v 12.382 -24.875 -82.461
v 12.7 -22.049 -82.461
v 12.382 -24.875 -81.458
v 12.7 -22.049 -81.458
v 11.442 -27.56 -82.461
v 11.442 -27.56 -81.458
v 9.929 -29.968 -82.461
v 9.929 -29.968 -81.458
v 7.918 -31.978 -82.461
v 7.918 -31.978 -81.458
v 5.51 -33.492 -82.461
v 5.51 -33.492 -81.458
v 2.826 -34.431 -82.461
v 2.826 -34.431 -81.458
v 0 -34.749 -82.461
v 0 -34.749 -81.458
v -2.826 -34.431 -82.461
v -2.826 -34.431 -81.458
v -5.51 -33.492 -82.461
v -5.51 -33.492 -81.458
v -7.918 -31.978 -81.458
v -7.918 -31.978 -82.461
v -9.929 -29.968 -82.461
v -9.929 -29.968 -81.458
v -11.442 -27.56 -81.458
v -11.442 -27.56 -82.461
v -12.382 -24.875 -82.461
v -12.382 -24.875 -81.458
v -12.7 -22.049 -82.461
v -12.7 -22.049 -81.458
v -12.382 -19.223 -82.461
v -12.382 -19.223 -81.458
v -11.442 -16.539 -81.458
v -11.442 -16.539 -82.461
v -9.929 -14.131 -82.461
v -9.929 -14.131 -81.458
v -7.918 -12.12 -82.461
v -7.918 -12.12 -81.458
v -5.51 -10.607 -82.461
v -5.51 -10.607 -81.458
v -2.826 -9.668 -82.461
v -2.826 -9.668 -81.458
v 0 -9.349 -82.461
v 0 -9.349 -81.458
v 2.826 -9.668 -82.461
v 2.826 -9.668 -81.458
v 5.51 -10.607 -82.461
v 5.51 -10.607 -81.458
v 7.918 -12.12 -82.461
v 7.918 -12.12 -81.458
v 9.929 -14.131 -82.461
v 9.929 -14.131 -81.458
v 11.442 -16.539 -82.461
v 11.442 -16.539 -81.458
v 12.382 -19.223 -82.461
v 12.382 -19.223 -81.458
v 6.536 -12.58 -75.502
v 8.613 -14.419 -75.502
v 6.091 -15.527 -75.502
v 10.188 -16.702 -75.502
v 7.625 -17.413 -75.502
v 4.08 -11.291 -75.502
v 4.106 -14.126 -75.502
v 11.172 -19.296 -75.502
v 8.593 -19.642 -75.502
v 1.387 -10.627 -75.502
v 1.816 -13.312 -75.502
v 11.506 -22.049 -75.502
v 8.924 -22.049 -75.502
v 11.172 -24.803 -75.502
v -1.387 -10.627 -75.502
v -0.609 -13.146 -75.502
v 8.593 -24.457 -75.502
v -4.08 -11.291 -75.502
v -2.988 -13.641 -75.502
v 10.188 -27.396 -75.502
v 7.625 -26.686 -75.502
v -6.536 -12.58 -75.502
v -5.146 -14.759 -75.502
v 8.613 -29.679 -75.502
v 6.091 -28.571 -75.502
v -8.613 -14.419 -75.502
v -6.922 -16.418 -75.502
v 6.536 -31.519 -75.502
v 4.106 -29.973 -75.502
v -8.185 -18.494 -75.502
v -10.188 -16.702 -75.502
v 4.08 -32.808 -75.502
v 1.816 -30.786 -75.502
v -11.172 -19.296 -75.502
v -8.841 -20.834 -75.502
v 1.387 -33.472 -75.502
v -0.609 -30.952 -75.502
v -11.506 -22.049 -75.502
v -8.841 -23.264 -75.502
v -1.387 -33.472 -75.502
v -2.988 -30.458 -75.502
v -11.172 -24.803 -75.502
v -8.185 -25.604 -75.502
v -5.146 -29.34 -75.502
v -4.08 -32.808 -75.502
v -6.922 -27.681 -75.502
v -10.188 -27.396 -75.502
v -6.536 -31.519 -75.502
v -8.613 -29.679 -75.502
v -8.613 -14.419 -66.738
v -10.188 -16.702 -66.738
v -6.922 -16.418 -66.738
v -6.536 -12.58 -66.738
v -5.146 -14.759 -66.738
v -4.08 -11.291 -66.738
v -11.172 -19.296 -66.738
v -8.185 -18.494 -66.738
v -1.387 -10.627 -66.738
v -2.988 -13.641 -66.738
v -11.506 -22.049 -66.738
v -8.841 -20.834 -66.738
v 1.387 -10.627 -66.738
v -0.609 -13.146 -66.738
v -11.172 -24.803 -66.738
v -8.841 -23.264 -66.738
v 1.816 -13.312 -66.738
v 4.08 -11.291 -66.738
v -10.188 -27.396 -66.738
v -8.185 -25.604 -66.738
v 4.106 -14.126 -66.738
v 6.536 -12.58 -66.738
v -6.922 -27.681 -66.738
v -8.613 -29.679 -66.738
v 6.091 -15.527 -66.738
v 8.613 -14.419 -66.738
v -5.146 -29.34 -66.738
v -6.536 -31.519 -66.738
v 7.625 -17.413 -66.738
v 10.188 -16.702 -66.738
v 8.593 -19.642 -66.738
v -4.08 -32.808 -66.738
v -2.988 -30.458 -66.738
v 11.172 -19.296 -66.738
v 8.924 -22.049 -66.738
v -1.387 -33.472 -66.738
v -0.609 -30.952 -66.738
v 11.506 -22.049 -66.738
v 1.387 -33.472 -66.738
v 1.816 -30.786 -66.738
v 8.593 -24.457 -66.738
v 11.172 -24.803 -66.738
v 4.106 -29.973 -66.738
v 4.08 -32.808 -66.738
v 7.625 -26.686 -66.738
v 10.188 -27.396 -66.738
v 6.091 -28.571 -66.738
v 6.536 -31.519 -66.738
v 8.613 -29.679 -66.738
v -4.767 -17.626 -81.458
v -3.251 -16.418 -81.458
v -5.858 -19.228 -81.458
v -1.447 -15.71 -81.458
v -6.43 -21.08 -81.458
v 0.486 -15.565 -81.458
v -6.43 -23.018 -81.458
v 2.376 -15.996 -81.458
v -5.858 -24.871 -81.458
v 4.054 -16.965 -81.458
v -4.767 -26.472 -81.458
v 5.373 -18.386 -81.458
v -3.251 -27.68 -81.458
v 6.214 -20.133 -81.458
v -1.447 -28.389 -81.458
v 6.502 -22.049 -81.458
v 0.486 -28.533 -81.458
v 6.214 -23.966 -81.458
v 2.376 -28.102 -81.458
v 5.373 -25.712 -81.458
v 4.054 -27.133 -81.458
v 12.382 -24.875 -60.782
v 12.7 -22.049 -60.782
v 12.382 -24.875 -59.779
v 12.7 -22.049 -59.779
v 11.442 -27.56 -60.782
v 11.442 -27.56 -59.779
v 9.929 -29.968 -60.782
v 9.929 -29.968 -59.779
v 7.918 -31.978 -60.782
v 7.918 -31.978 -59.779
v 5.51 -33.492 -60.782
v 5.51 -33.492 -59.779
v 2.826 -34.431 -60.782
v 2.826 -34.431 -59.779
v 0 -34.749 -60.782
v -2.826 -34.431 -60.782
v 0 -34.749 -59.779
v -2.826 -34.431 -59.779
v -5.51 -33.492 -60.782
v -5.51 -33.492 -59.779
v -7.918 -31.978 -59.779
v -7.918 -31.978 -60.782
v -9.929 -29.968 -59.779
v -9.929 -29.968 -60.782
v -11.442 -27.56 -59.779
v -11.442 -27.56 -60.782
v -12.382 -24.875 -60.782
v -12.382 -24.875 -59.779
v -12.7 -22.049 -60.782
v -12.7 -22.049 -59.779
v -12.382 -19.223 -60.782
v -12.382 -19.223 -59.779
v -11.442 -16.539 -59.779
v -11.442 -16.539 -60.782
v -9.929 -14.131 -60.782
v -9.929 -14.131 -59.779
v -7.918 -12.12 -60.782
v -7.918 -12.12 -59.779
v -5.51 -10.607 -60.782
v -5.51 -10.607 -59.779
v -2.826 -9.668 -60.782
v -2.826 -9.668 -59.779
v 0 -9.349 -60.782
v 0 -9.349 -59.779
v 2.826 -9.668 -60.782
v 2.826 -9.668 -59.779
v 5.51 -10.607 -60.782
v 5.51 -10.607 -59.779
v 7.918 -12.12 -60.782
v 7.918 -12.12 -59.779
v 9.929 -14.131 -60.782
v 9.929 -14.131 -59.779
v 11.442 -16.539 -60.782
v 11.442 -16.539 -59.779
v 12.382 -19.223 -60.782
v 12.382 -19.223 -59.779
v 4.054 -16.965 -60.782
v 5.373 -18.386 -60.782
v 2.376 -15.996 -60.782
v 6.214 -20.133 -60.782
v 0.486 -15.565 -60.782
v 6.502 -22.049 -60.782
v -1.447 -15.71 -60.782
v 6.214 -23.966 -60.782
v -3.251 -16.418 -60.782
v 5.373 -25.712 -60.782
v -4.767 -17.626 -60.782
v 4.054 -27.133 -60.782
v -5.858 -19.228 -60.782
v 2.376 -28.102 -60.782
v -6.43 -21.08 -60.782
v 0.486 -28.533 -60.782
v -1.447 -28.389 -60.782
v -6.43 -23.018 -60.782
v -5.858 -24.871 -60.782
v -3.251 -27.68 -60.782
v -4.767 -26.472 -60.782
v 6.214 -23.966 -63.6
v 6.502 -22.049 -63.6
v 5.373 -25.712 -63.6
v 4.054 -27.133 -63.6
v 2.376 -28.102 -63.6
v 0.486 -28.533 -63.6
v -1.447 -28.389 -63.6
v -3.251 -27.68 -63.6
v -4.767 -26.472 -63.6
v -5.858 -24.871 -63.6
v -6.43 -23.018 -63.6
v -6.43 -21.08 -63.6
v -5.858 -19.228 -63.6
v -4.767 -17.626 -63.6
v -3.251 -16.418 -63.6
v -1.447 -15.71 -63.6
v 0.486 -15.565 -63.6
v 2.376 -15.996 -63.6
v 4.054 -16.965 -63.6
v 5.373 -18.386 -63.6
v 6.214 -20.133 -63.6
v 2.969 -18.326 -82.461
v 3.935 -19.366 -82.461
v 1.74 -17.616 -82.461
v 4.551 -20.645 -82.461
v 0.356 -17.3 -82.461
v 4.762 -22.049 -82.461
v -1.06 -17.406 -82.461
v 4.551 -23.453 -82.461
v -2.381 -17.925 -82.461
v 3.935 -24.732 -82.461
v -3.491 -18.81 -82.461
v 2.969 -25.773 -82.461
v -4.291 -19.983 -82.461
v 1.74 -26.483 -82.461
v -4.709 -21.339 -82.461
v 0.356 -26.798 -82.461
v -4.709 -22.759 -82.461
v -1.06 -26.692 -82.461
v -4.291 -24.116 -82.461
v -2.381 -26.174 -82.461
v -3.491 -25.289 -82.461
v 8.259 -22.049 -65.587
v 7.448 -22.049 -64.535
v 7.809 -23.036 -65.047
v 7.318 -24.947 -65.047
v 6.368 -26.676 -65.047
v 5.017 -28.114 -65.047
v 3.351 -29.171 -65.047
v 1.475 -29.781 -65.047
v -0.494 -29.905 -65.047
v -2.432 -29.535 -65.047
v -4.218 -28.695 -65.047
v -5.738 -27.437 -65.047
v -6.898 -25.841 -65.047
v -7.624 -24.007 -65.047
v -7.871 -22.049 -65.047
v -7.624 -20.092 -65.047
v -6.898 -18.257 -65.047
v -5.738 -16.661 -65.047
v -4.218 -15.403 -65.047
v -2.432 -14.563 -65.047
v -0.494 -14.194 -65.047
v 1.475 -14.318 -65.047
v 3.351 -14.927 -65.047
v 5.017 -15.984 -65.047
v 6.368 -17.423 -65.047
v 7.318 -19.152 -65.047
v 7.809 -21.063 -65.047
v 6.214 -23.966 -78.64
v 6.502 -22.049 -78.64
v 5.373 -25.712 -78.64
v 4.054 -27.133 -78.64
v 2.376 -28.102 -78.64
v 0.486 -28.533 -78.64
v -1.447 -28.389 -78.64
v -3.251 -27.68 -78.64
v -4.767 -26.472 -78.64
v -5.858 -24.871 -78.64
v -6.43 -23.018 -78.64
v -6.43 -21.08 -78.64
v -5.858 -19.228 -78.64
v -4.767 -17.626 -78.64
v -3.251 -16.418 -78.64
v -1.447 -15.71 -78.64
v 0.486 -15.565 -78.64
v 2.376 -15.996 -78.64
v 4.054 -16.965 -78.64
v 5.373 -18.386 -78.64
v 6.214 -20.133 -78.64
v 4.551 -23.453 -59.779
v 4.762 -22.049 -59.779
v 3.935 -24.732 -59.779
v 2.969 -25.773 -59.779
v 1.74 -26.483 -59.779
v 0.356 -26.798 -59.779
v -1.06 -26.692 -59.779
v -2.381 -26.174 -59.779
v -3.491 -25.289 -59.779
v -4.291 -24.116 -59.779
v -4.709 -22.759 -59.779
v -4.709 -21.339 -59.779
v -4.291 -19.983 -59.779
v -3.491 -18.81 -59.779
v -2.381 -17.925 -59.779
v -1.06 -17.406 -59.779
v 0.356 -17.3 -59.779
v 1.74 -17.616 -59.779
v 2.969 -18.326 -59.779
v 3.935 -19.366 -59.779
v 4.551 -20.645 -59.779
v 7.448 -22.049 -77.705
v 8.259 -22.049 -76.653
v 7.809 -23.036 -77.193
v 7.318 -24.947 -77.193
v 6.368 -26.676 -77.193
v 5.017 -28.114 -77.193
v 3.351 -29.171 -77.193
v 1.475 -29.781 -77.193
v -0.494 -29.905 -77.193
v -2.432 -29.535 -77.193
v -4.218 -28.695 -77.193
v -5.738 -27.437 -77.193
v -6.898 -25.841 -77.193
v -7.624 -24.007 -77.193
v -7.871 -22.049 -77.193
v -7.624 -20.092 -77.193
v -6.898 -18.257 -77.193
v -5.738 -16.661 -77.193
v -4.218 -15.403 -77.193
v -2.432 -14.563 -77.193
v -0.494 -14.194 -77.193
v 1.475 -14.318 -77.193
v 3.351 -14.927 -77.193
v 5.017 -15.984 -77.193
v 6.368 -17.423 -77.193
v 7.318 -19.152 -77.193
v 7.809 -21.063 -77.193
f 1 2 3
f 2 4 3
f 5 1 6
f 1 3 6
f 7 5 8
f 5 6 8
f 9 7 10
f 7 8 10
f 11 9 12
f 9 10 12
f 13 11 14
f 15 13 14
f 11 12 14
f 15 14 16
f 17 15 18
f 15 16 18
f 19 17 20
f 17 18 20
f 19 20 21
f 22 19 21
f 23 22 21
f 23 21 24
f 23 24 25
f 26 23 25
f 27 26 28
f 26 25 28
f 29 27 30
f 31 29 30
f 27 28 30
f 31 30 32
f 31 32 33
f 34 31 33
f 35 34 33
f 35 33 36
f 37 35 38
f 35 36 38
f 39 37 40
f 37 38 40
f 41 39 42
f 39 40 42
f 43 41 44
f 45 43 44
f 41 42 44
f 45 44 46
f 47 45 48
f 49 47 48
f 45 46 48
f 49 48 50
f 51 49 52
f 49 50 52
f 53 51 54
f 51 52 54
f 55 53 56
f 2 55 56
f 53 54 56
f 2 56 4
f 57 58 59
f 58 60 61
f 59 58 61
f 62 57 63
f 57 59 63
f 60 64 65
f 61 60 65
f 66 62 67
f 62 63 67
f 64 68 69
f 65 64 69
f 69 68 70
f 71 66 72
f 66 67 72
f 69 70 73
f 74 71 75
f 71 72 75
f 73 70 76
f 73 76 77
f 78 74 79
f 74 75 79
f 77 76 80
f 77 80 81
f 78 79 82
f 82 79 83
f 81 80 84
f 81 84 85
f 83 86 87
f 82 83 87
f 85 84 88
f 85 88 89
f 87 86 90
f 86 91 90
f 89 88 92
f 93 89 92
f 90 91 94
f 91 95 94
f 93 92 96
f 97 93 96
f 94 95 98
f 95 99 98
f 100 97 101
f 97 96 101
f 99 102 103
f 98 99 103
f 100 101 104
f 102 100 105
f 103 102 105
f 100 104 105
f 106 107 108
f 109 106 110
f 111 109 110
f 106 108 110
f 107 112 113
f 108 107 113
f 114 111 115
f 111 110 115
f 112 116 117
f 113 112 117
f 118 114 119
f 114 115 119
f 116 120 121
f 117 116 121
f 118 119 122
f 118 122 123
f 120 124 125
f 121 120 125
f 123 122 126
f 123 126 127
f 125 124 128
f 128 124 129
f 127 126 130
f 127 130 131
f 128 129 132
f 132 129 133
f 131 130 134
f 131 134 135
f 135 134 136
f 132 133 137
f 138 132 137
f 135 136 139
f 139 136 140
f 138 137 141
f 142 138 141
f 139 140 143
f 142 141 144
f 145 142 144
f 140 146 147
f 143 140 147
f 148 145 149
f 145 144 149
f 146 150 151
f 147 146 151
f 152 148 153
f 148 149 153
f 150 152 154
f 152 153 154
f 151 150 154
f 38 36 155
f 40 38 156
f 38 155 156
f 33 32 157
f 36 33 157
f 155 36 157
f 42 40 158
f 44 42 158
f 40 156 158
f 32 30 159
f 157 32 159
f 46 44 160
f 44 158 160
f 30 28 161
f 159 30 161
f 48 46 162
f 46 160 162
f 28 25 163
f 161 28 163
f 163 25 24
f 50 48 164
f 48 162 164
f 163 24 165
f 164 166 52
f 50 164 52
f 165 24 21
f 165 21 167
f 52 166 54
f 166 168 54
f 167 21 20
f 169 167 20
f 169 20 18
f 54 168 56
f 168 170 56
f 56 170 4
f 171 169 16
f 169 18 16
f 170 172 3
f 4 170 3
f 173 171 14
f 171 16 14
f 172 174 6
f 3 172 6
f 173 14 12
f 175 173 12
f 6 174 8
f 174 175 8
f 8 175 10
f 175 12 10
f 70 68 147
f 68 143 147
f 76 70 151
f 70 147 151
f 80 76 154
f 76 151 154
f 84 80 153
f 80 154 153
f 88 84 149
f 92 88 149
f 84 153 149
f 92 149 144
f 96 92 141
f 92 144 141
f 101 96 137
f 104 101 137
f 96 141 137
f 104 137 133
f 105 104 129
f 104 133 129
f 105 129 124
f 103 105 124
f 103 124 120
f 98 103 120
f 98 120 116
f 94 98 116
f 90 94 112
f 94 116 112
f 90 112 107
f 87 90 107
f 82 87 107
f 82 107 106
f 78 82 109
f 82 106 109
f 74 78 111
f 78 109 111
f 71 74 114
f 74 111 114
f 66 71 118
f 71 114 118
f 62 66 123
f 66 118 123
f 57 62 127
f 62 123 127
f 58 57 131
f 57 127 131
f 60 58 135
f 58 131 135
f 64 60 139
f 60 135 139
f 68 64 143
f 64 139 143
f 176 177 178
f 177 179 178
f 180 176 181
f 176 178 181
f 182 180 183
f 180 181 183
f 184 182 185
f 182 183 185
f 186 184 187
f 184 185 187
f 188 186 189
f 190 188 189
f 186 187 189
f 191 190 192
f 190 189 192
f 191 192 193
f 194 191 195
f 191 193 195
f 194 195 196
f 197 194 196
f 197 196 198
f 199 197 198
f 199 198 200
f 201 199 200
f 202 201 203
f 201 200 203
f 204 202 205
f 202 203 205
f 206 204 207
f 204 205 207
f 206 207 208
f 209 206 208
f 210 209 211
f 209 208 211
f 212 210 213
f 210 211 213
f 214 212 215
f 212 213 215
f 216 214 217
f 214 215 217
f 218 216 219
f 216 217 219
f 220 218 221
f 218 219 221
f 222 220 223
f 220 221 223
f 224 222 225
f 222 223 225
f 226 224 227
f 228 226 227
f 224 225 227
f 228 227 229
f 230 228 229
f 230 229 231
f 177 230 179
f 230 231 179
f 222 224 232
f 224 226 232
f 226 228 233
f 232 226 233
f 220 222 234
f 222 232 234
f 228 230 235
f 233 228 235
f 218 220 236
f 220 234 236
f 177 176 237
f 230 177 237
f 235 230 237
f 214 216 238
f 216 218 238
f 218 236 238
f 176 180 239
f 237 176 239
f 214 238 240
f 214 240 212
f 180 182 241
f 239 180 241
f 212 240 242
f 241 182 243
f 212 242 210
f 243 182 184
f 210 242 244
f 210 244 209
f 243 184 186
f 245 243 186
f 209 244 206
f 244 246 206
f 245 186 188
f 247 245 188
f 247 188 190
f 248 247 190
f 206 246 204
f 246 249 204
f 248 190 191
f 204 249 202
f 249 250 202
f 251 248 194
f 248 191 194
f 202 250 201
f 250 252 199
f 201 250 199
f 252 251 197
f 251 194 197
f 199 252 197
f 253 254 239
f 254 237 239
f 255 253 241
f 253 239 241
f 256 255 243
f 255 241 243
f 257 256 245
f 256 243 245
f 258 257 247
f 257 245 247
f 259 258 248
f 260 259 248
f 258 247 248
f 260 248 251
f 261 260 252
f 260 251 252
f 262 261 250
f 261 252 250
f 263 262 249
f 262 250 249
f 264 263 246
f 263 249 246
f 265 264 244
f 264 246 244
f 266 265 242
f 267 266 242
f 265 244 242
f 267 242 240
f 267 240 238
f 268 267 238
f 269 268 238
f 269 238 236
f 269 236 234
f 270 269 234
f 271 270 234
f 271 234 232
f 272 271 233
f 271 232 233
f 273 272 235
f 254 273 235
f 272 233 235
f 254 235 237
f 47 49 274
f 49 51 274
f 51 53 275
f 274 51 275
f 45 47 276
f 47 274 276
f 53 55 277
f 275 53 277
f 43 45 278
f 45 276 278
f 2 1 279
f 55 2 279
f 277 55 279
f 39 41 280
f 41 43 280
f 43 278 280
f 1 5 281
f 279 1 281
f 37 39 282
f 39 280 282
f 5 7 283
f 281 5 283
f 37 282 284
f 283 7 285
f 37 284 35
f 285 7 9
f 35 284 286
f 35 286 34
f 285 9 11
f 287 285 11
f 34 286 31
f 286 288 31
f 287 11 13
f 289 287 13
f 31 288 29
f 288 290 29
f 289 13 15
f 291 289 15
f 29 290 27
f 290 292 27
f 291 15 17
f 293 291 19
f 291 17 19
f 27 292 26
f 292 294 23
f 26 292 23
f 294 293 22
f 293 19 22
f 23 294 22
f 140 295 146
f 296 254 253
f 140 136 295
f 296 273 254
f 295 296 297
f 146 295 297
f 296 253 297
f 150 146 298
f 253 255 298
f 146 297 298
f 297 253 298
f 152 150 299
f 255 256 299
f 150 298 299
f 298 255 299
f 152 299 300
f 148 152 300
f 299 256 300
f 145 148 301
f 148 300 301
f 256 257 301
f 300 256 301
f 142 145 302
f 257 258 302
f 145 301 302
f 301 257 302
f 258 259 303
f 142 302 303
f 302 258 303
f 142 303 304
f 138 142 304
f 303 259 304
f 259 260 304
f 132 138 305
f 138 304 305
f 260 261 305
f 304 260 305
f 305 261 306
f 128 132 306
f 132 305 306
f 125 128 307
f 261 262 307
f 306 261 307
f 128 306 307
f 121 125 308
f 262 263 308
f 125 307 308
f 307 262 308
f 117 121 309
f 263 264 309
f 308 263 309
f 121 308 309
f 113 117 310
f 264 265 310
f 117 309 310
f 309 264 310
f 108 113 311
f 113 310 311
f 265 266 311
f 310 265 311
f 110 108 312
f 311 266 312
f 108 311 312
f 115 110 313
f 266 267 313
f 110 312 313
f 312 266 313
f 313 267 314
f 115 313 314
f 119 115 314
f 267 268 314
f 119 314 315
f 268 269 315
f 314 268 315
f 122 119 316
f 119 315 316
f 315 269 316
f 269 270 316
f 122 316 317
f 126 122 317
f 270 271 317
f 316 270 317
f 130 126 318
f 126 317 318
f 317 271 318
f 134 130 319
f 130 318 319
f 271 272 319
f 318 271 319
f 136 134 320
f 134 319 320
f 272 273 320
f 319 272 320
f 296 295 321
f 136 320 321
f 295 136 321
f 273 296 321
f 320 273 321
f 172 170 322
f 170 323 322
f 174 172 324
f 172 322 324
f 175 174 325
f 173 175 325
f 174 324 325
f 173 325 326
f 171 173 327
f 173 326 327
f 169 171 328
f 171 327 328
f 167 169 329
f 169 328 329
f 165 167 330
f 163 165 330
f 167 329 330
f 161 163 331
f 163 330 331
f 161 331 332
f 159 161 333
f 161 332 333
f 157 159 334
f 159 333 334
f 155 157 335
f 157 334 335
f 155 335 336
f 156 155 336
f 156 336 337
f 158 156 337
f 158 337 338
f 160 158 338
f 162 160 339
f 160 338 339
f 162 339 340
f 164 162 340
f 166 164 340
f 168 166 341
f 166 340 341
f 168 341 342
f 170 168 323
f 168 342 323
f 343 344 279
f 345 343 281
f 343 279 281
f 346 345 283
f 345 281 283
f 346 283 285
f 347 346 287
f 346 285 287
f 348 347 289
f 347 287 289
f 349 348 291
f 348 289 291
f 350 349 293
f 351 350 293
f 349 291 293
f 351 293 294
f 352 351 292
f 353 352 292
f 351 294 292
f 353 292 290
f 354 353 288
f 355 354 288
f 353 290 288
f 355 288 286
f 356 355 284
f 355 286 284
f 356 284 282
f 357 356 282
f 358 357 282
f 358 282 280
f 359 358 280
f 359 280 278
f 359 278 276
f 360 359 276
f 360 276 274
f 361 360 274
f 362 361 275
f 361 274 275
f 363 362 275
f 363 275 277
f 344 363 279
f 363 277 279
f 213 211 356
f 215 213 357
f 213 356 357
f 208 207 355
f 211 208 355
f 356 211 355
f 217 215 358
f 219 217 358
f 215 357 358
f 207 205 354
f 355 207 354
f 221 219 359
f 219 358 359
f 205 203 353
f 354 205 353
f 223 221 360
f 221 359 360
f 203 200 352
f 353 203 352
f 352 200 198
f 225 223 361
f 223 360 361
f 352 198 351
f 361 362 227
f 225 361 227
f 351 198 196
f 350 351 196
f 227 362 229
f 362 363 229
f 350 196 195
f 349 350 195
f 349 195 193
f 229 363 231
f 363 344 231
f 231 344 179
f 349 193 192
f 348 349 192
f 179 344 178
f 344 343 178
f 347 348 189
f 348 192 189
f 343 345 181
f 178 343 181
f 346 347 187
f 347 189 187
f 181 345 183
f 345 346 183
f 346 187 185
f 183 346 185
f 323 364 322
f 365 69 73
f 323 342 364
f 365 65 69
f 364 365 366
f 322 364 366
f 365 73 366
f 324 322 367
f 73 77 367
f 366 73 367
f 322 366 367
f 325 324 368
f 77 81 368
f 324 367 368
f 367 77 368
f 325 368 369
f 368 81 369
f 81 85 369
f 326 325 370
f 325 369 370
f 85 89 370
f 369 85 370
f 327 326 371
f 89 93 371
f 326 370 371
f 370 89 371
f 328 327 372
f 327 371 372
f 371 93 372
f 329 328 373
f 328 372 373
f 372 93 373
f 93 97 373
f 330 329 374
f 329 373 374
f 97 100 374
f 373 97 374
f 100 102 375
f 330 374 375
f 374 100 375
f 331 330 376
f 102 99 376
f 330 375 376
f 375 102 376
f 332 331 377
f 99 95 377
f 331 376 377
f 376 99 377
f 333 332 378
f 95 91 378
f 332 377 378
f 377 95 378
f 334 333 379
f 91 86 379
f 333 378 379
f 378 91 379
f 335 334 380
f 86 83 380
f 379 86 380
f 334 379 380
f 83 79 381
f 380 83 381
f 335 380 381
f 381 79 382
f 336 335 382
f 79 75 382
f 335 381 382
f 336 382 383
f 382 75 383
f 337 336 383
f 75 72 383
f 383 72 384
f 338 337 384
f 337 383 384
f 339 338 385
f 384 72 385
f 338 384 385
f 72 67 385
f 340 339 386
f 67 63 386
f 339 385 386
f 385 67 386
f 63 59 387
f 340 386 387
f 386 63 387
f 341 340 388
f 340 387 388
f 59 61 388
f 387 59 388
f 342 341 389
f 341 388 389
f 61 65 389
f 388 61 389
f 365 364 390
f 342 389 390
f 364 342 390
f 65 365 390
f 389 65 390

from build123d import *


with BuildPart() as part:
    # Sketch1 → Revolve1 (revolve)
    with BuildSketch(Plane(origin=(0, 0, 0), x_dir=(0, 0, -1), z_dir=(1, 0, 0)), mode=Mode.PRIVATE) as revolve1_sk:
        with BuildLine():
            Line((60.7822, -26.811732), (81.4578, -26.811732))
            Line((81.4578, -26.811732), (82.4611, -26.811732))
            Line((82.4611, -26.811732), (82.4611, -34.749232))
            Line((82.4611, -34.749232), (81.4578, -34.749232))
            Line((81.4578, -34.749232), (81.4578, -28.551632))
            Line((81.4578, -28.551632), (78.639993039, -28.551632))
            ThreePointArc((78.639993039, -28.551632), (77.1926569, -29.920339878), (75.5015, -30.973018125))
            Line((75.5015, -30.973018125), (75.5015, -33.555432))
            Line((75.5015, -33.555432), (66.7385, -33.555432))
            Line((66.7385, -33.555432), (66.7385, -30.973018125))
            ThreePointArc((66.7385, -30.973018125), (65.0473431, -29.920339878), (63.600006961, -28.551632))
            Line((63.600006961, -28.551632), (60.7822, -28.551632))
            Line((60.7822, -28.551632), (60.7822, -34.749232))
            Line((60.7822, -34.749232), (59.7789, -34.749232))
            Line((59.7789, -34.749232), (59.7789, -26.811732))
            Line((59.7789, -26.811732), (60.7822, -26.811732))
        make_face()
    revolve(revolve1_sk.sketch.rotate(Axis((0, -22.049232, -82.136173087), (0, 0, -1)), 270), axis=Axis((0, -22.049232, -82.136173087), (0, 0, -1)))


solid = part.part
